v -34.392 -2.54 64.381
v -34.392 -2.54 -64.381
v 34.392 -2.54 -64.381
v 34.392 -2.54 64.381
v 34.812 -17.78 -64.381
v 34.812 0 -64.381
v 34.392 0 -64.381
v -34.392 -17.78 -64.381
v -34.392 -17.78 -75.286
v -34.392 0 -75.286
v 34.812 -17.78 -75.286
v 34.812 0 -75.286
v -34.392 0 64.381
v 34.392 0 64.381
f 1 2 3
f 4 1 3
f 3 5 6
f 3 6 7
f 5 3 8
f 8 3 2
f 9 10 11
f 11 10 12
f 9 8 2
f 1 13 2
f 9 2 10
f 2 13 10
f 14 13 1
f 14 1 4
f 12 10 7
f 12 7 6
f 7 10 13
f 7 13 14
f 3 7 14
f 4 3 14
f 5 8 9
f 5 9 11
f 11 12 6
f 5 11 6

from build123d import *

# Parameters (mm, degrees)
F0_W     = 68.784848
F0_H     = 128.761858
F1_DEPTH = 2.54
F2_DEPTH = 17.78


with BuildPart() as f1:
    # F0 (on Front) → F1 (new body)
    with BuildSketch(Plane.XZ):
        Rectangle(F0_W, F0_H)
    extrude(amount=F1_DEPTH)

    # F0 (on Front) → F2 (join)
    with BuildSketch(Plane.XZ):
        Polygon((34.392424, -64.380929), (-34.392424, -64.380929), (-34.392424, -75.285852), (34.811836, -75.285852), (34.811836, -64.380929), align=None)
    extrude(amount=F2_DEPTH)


solid = f1.part
